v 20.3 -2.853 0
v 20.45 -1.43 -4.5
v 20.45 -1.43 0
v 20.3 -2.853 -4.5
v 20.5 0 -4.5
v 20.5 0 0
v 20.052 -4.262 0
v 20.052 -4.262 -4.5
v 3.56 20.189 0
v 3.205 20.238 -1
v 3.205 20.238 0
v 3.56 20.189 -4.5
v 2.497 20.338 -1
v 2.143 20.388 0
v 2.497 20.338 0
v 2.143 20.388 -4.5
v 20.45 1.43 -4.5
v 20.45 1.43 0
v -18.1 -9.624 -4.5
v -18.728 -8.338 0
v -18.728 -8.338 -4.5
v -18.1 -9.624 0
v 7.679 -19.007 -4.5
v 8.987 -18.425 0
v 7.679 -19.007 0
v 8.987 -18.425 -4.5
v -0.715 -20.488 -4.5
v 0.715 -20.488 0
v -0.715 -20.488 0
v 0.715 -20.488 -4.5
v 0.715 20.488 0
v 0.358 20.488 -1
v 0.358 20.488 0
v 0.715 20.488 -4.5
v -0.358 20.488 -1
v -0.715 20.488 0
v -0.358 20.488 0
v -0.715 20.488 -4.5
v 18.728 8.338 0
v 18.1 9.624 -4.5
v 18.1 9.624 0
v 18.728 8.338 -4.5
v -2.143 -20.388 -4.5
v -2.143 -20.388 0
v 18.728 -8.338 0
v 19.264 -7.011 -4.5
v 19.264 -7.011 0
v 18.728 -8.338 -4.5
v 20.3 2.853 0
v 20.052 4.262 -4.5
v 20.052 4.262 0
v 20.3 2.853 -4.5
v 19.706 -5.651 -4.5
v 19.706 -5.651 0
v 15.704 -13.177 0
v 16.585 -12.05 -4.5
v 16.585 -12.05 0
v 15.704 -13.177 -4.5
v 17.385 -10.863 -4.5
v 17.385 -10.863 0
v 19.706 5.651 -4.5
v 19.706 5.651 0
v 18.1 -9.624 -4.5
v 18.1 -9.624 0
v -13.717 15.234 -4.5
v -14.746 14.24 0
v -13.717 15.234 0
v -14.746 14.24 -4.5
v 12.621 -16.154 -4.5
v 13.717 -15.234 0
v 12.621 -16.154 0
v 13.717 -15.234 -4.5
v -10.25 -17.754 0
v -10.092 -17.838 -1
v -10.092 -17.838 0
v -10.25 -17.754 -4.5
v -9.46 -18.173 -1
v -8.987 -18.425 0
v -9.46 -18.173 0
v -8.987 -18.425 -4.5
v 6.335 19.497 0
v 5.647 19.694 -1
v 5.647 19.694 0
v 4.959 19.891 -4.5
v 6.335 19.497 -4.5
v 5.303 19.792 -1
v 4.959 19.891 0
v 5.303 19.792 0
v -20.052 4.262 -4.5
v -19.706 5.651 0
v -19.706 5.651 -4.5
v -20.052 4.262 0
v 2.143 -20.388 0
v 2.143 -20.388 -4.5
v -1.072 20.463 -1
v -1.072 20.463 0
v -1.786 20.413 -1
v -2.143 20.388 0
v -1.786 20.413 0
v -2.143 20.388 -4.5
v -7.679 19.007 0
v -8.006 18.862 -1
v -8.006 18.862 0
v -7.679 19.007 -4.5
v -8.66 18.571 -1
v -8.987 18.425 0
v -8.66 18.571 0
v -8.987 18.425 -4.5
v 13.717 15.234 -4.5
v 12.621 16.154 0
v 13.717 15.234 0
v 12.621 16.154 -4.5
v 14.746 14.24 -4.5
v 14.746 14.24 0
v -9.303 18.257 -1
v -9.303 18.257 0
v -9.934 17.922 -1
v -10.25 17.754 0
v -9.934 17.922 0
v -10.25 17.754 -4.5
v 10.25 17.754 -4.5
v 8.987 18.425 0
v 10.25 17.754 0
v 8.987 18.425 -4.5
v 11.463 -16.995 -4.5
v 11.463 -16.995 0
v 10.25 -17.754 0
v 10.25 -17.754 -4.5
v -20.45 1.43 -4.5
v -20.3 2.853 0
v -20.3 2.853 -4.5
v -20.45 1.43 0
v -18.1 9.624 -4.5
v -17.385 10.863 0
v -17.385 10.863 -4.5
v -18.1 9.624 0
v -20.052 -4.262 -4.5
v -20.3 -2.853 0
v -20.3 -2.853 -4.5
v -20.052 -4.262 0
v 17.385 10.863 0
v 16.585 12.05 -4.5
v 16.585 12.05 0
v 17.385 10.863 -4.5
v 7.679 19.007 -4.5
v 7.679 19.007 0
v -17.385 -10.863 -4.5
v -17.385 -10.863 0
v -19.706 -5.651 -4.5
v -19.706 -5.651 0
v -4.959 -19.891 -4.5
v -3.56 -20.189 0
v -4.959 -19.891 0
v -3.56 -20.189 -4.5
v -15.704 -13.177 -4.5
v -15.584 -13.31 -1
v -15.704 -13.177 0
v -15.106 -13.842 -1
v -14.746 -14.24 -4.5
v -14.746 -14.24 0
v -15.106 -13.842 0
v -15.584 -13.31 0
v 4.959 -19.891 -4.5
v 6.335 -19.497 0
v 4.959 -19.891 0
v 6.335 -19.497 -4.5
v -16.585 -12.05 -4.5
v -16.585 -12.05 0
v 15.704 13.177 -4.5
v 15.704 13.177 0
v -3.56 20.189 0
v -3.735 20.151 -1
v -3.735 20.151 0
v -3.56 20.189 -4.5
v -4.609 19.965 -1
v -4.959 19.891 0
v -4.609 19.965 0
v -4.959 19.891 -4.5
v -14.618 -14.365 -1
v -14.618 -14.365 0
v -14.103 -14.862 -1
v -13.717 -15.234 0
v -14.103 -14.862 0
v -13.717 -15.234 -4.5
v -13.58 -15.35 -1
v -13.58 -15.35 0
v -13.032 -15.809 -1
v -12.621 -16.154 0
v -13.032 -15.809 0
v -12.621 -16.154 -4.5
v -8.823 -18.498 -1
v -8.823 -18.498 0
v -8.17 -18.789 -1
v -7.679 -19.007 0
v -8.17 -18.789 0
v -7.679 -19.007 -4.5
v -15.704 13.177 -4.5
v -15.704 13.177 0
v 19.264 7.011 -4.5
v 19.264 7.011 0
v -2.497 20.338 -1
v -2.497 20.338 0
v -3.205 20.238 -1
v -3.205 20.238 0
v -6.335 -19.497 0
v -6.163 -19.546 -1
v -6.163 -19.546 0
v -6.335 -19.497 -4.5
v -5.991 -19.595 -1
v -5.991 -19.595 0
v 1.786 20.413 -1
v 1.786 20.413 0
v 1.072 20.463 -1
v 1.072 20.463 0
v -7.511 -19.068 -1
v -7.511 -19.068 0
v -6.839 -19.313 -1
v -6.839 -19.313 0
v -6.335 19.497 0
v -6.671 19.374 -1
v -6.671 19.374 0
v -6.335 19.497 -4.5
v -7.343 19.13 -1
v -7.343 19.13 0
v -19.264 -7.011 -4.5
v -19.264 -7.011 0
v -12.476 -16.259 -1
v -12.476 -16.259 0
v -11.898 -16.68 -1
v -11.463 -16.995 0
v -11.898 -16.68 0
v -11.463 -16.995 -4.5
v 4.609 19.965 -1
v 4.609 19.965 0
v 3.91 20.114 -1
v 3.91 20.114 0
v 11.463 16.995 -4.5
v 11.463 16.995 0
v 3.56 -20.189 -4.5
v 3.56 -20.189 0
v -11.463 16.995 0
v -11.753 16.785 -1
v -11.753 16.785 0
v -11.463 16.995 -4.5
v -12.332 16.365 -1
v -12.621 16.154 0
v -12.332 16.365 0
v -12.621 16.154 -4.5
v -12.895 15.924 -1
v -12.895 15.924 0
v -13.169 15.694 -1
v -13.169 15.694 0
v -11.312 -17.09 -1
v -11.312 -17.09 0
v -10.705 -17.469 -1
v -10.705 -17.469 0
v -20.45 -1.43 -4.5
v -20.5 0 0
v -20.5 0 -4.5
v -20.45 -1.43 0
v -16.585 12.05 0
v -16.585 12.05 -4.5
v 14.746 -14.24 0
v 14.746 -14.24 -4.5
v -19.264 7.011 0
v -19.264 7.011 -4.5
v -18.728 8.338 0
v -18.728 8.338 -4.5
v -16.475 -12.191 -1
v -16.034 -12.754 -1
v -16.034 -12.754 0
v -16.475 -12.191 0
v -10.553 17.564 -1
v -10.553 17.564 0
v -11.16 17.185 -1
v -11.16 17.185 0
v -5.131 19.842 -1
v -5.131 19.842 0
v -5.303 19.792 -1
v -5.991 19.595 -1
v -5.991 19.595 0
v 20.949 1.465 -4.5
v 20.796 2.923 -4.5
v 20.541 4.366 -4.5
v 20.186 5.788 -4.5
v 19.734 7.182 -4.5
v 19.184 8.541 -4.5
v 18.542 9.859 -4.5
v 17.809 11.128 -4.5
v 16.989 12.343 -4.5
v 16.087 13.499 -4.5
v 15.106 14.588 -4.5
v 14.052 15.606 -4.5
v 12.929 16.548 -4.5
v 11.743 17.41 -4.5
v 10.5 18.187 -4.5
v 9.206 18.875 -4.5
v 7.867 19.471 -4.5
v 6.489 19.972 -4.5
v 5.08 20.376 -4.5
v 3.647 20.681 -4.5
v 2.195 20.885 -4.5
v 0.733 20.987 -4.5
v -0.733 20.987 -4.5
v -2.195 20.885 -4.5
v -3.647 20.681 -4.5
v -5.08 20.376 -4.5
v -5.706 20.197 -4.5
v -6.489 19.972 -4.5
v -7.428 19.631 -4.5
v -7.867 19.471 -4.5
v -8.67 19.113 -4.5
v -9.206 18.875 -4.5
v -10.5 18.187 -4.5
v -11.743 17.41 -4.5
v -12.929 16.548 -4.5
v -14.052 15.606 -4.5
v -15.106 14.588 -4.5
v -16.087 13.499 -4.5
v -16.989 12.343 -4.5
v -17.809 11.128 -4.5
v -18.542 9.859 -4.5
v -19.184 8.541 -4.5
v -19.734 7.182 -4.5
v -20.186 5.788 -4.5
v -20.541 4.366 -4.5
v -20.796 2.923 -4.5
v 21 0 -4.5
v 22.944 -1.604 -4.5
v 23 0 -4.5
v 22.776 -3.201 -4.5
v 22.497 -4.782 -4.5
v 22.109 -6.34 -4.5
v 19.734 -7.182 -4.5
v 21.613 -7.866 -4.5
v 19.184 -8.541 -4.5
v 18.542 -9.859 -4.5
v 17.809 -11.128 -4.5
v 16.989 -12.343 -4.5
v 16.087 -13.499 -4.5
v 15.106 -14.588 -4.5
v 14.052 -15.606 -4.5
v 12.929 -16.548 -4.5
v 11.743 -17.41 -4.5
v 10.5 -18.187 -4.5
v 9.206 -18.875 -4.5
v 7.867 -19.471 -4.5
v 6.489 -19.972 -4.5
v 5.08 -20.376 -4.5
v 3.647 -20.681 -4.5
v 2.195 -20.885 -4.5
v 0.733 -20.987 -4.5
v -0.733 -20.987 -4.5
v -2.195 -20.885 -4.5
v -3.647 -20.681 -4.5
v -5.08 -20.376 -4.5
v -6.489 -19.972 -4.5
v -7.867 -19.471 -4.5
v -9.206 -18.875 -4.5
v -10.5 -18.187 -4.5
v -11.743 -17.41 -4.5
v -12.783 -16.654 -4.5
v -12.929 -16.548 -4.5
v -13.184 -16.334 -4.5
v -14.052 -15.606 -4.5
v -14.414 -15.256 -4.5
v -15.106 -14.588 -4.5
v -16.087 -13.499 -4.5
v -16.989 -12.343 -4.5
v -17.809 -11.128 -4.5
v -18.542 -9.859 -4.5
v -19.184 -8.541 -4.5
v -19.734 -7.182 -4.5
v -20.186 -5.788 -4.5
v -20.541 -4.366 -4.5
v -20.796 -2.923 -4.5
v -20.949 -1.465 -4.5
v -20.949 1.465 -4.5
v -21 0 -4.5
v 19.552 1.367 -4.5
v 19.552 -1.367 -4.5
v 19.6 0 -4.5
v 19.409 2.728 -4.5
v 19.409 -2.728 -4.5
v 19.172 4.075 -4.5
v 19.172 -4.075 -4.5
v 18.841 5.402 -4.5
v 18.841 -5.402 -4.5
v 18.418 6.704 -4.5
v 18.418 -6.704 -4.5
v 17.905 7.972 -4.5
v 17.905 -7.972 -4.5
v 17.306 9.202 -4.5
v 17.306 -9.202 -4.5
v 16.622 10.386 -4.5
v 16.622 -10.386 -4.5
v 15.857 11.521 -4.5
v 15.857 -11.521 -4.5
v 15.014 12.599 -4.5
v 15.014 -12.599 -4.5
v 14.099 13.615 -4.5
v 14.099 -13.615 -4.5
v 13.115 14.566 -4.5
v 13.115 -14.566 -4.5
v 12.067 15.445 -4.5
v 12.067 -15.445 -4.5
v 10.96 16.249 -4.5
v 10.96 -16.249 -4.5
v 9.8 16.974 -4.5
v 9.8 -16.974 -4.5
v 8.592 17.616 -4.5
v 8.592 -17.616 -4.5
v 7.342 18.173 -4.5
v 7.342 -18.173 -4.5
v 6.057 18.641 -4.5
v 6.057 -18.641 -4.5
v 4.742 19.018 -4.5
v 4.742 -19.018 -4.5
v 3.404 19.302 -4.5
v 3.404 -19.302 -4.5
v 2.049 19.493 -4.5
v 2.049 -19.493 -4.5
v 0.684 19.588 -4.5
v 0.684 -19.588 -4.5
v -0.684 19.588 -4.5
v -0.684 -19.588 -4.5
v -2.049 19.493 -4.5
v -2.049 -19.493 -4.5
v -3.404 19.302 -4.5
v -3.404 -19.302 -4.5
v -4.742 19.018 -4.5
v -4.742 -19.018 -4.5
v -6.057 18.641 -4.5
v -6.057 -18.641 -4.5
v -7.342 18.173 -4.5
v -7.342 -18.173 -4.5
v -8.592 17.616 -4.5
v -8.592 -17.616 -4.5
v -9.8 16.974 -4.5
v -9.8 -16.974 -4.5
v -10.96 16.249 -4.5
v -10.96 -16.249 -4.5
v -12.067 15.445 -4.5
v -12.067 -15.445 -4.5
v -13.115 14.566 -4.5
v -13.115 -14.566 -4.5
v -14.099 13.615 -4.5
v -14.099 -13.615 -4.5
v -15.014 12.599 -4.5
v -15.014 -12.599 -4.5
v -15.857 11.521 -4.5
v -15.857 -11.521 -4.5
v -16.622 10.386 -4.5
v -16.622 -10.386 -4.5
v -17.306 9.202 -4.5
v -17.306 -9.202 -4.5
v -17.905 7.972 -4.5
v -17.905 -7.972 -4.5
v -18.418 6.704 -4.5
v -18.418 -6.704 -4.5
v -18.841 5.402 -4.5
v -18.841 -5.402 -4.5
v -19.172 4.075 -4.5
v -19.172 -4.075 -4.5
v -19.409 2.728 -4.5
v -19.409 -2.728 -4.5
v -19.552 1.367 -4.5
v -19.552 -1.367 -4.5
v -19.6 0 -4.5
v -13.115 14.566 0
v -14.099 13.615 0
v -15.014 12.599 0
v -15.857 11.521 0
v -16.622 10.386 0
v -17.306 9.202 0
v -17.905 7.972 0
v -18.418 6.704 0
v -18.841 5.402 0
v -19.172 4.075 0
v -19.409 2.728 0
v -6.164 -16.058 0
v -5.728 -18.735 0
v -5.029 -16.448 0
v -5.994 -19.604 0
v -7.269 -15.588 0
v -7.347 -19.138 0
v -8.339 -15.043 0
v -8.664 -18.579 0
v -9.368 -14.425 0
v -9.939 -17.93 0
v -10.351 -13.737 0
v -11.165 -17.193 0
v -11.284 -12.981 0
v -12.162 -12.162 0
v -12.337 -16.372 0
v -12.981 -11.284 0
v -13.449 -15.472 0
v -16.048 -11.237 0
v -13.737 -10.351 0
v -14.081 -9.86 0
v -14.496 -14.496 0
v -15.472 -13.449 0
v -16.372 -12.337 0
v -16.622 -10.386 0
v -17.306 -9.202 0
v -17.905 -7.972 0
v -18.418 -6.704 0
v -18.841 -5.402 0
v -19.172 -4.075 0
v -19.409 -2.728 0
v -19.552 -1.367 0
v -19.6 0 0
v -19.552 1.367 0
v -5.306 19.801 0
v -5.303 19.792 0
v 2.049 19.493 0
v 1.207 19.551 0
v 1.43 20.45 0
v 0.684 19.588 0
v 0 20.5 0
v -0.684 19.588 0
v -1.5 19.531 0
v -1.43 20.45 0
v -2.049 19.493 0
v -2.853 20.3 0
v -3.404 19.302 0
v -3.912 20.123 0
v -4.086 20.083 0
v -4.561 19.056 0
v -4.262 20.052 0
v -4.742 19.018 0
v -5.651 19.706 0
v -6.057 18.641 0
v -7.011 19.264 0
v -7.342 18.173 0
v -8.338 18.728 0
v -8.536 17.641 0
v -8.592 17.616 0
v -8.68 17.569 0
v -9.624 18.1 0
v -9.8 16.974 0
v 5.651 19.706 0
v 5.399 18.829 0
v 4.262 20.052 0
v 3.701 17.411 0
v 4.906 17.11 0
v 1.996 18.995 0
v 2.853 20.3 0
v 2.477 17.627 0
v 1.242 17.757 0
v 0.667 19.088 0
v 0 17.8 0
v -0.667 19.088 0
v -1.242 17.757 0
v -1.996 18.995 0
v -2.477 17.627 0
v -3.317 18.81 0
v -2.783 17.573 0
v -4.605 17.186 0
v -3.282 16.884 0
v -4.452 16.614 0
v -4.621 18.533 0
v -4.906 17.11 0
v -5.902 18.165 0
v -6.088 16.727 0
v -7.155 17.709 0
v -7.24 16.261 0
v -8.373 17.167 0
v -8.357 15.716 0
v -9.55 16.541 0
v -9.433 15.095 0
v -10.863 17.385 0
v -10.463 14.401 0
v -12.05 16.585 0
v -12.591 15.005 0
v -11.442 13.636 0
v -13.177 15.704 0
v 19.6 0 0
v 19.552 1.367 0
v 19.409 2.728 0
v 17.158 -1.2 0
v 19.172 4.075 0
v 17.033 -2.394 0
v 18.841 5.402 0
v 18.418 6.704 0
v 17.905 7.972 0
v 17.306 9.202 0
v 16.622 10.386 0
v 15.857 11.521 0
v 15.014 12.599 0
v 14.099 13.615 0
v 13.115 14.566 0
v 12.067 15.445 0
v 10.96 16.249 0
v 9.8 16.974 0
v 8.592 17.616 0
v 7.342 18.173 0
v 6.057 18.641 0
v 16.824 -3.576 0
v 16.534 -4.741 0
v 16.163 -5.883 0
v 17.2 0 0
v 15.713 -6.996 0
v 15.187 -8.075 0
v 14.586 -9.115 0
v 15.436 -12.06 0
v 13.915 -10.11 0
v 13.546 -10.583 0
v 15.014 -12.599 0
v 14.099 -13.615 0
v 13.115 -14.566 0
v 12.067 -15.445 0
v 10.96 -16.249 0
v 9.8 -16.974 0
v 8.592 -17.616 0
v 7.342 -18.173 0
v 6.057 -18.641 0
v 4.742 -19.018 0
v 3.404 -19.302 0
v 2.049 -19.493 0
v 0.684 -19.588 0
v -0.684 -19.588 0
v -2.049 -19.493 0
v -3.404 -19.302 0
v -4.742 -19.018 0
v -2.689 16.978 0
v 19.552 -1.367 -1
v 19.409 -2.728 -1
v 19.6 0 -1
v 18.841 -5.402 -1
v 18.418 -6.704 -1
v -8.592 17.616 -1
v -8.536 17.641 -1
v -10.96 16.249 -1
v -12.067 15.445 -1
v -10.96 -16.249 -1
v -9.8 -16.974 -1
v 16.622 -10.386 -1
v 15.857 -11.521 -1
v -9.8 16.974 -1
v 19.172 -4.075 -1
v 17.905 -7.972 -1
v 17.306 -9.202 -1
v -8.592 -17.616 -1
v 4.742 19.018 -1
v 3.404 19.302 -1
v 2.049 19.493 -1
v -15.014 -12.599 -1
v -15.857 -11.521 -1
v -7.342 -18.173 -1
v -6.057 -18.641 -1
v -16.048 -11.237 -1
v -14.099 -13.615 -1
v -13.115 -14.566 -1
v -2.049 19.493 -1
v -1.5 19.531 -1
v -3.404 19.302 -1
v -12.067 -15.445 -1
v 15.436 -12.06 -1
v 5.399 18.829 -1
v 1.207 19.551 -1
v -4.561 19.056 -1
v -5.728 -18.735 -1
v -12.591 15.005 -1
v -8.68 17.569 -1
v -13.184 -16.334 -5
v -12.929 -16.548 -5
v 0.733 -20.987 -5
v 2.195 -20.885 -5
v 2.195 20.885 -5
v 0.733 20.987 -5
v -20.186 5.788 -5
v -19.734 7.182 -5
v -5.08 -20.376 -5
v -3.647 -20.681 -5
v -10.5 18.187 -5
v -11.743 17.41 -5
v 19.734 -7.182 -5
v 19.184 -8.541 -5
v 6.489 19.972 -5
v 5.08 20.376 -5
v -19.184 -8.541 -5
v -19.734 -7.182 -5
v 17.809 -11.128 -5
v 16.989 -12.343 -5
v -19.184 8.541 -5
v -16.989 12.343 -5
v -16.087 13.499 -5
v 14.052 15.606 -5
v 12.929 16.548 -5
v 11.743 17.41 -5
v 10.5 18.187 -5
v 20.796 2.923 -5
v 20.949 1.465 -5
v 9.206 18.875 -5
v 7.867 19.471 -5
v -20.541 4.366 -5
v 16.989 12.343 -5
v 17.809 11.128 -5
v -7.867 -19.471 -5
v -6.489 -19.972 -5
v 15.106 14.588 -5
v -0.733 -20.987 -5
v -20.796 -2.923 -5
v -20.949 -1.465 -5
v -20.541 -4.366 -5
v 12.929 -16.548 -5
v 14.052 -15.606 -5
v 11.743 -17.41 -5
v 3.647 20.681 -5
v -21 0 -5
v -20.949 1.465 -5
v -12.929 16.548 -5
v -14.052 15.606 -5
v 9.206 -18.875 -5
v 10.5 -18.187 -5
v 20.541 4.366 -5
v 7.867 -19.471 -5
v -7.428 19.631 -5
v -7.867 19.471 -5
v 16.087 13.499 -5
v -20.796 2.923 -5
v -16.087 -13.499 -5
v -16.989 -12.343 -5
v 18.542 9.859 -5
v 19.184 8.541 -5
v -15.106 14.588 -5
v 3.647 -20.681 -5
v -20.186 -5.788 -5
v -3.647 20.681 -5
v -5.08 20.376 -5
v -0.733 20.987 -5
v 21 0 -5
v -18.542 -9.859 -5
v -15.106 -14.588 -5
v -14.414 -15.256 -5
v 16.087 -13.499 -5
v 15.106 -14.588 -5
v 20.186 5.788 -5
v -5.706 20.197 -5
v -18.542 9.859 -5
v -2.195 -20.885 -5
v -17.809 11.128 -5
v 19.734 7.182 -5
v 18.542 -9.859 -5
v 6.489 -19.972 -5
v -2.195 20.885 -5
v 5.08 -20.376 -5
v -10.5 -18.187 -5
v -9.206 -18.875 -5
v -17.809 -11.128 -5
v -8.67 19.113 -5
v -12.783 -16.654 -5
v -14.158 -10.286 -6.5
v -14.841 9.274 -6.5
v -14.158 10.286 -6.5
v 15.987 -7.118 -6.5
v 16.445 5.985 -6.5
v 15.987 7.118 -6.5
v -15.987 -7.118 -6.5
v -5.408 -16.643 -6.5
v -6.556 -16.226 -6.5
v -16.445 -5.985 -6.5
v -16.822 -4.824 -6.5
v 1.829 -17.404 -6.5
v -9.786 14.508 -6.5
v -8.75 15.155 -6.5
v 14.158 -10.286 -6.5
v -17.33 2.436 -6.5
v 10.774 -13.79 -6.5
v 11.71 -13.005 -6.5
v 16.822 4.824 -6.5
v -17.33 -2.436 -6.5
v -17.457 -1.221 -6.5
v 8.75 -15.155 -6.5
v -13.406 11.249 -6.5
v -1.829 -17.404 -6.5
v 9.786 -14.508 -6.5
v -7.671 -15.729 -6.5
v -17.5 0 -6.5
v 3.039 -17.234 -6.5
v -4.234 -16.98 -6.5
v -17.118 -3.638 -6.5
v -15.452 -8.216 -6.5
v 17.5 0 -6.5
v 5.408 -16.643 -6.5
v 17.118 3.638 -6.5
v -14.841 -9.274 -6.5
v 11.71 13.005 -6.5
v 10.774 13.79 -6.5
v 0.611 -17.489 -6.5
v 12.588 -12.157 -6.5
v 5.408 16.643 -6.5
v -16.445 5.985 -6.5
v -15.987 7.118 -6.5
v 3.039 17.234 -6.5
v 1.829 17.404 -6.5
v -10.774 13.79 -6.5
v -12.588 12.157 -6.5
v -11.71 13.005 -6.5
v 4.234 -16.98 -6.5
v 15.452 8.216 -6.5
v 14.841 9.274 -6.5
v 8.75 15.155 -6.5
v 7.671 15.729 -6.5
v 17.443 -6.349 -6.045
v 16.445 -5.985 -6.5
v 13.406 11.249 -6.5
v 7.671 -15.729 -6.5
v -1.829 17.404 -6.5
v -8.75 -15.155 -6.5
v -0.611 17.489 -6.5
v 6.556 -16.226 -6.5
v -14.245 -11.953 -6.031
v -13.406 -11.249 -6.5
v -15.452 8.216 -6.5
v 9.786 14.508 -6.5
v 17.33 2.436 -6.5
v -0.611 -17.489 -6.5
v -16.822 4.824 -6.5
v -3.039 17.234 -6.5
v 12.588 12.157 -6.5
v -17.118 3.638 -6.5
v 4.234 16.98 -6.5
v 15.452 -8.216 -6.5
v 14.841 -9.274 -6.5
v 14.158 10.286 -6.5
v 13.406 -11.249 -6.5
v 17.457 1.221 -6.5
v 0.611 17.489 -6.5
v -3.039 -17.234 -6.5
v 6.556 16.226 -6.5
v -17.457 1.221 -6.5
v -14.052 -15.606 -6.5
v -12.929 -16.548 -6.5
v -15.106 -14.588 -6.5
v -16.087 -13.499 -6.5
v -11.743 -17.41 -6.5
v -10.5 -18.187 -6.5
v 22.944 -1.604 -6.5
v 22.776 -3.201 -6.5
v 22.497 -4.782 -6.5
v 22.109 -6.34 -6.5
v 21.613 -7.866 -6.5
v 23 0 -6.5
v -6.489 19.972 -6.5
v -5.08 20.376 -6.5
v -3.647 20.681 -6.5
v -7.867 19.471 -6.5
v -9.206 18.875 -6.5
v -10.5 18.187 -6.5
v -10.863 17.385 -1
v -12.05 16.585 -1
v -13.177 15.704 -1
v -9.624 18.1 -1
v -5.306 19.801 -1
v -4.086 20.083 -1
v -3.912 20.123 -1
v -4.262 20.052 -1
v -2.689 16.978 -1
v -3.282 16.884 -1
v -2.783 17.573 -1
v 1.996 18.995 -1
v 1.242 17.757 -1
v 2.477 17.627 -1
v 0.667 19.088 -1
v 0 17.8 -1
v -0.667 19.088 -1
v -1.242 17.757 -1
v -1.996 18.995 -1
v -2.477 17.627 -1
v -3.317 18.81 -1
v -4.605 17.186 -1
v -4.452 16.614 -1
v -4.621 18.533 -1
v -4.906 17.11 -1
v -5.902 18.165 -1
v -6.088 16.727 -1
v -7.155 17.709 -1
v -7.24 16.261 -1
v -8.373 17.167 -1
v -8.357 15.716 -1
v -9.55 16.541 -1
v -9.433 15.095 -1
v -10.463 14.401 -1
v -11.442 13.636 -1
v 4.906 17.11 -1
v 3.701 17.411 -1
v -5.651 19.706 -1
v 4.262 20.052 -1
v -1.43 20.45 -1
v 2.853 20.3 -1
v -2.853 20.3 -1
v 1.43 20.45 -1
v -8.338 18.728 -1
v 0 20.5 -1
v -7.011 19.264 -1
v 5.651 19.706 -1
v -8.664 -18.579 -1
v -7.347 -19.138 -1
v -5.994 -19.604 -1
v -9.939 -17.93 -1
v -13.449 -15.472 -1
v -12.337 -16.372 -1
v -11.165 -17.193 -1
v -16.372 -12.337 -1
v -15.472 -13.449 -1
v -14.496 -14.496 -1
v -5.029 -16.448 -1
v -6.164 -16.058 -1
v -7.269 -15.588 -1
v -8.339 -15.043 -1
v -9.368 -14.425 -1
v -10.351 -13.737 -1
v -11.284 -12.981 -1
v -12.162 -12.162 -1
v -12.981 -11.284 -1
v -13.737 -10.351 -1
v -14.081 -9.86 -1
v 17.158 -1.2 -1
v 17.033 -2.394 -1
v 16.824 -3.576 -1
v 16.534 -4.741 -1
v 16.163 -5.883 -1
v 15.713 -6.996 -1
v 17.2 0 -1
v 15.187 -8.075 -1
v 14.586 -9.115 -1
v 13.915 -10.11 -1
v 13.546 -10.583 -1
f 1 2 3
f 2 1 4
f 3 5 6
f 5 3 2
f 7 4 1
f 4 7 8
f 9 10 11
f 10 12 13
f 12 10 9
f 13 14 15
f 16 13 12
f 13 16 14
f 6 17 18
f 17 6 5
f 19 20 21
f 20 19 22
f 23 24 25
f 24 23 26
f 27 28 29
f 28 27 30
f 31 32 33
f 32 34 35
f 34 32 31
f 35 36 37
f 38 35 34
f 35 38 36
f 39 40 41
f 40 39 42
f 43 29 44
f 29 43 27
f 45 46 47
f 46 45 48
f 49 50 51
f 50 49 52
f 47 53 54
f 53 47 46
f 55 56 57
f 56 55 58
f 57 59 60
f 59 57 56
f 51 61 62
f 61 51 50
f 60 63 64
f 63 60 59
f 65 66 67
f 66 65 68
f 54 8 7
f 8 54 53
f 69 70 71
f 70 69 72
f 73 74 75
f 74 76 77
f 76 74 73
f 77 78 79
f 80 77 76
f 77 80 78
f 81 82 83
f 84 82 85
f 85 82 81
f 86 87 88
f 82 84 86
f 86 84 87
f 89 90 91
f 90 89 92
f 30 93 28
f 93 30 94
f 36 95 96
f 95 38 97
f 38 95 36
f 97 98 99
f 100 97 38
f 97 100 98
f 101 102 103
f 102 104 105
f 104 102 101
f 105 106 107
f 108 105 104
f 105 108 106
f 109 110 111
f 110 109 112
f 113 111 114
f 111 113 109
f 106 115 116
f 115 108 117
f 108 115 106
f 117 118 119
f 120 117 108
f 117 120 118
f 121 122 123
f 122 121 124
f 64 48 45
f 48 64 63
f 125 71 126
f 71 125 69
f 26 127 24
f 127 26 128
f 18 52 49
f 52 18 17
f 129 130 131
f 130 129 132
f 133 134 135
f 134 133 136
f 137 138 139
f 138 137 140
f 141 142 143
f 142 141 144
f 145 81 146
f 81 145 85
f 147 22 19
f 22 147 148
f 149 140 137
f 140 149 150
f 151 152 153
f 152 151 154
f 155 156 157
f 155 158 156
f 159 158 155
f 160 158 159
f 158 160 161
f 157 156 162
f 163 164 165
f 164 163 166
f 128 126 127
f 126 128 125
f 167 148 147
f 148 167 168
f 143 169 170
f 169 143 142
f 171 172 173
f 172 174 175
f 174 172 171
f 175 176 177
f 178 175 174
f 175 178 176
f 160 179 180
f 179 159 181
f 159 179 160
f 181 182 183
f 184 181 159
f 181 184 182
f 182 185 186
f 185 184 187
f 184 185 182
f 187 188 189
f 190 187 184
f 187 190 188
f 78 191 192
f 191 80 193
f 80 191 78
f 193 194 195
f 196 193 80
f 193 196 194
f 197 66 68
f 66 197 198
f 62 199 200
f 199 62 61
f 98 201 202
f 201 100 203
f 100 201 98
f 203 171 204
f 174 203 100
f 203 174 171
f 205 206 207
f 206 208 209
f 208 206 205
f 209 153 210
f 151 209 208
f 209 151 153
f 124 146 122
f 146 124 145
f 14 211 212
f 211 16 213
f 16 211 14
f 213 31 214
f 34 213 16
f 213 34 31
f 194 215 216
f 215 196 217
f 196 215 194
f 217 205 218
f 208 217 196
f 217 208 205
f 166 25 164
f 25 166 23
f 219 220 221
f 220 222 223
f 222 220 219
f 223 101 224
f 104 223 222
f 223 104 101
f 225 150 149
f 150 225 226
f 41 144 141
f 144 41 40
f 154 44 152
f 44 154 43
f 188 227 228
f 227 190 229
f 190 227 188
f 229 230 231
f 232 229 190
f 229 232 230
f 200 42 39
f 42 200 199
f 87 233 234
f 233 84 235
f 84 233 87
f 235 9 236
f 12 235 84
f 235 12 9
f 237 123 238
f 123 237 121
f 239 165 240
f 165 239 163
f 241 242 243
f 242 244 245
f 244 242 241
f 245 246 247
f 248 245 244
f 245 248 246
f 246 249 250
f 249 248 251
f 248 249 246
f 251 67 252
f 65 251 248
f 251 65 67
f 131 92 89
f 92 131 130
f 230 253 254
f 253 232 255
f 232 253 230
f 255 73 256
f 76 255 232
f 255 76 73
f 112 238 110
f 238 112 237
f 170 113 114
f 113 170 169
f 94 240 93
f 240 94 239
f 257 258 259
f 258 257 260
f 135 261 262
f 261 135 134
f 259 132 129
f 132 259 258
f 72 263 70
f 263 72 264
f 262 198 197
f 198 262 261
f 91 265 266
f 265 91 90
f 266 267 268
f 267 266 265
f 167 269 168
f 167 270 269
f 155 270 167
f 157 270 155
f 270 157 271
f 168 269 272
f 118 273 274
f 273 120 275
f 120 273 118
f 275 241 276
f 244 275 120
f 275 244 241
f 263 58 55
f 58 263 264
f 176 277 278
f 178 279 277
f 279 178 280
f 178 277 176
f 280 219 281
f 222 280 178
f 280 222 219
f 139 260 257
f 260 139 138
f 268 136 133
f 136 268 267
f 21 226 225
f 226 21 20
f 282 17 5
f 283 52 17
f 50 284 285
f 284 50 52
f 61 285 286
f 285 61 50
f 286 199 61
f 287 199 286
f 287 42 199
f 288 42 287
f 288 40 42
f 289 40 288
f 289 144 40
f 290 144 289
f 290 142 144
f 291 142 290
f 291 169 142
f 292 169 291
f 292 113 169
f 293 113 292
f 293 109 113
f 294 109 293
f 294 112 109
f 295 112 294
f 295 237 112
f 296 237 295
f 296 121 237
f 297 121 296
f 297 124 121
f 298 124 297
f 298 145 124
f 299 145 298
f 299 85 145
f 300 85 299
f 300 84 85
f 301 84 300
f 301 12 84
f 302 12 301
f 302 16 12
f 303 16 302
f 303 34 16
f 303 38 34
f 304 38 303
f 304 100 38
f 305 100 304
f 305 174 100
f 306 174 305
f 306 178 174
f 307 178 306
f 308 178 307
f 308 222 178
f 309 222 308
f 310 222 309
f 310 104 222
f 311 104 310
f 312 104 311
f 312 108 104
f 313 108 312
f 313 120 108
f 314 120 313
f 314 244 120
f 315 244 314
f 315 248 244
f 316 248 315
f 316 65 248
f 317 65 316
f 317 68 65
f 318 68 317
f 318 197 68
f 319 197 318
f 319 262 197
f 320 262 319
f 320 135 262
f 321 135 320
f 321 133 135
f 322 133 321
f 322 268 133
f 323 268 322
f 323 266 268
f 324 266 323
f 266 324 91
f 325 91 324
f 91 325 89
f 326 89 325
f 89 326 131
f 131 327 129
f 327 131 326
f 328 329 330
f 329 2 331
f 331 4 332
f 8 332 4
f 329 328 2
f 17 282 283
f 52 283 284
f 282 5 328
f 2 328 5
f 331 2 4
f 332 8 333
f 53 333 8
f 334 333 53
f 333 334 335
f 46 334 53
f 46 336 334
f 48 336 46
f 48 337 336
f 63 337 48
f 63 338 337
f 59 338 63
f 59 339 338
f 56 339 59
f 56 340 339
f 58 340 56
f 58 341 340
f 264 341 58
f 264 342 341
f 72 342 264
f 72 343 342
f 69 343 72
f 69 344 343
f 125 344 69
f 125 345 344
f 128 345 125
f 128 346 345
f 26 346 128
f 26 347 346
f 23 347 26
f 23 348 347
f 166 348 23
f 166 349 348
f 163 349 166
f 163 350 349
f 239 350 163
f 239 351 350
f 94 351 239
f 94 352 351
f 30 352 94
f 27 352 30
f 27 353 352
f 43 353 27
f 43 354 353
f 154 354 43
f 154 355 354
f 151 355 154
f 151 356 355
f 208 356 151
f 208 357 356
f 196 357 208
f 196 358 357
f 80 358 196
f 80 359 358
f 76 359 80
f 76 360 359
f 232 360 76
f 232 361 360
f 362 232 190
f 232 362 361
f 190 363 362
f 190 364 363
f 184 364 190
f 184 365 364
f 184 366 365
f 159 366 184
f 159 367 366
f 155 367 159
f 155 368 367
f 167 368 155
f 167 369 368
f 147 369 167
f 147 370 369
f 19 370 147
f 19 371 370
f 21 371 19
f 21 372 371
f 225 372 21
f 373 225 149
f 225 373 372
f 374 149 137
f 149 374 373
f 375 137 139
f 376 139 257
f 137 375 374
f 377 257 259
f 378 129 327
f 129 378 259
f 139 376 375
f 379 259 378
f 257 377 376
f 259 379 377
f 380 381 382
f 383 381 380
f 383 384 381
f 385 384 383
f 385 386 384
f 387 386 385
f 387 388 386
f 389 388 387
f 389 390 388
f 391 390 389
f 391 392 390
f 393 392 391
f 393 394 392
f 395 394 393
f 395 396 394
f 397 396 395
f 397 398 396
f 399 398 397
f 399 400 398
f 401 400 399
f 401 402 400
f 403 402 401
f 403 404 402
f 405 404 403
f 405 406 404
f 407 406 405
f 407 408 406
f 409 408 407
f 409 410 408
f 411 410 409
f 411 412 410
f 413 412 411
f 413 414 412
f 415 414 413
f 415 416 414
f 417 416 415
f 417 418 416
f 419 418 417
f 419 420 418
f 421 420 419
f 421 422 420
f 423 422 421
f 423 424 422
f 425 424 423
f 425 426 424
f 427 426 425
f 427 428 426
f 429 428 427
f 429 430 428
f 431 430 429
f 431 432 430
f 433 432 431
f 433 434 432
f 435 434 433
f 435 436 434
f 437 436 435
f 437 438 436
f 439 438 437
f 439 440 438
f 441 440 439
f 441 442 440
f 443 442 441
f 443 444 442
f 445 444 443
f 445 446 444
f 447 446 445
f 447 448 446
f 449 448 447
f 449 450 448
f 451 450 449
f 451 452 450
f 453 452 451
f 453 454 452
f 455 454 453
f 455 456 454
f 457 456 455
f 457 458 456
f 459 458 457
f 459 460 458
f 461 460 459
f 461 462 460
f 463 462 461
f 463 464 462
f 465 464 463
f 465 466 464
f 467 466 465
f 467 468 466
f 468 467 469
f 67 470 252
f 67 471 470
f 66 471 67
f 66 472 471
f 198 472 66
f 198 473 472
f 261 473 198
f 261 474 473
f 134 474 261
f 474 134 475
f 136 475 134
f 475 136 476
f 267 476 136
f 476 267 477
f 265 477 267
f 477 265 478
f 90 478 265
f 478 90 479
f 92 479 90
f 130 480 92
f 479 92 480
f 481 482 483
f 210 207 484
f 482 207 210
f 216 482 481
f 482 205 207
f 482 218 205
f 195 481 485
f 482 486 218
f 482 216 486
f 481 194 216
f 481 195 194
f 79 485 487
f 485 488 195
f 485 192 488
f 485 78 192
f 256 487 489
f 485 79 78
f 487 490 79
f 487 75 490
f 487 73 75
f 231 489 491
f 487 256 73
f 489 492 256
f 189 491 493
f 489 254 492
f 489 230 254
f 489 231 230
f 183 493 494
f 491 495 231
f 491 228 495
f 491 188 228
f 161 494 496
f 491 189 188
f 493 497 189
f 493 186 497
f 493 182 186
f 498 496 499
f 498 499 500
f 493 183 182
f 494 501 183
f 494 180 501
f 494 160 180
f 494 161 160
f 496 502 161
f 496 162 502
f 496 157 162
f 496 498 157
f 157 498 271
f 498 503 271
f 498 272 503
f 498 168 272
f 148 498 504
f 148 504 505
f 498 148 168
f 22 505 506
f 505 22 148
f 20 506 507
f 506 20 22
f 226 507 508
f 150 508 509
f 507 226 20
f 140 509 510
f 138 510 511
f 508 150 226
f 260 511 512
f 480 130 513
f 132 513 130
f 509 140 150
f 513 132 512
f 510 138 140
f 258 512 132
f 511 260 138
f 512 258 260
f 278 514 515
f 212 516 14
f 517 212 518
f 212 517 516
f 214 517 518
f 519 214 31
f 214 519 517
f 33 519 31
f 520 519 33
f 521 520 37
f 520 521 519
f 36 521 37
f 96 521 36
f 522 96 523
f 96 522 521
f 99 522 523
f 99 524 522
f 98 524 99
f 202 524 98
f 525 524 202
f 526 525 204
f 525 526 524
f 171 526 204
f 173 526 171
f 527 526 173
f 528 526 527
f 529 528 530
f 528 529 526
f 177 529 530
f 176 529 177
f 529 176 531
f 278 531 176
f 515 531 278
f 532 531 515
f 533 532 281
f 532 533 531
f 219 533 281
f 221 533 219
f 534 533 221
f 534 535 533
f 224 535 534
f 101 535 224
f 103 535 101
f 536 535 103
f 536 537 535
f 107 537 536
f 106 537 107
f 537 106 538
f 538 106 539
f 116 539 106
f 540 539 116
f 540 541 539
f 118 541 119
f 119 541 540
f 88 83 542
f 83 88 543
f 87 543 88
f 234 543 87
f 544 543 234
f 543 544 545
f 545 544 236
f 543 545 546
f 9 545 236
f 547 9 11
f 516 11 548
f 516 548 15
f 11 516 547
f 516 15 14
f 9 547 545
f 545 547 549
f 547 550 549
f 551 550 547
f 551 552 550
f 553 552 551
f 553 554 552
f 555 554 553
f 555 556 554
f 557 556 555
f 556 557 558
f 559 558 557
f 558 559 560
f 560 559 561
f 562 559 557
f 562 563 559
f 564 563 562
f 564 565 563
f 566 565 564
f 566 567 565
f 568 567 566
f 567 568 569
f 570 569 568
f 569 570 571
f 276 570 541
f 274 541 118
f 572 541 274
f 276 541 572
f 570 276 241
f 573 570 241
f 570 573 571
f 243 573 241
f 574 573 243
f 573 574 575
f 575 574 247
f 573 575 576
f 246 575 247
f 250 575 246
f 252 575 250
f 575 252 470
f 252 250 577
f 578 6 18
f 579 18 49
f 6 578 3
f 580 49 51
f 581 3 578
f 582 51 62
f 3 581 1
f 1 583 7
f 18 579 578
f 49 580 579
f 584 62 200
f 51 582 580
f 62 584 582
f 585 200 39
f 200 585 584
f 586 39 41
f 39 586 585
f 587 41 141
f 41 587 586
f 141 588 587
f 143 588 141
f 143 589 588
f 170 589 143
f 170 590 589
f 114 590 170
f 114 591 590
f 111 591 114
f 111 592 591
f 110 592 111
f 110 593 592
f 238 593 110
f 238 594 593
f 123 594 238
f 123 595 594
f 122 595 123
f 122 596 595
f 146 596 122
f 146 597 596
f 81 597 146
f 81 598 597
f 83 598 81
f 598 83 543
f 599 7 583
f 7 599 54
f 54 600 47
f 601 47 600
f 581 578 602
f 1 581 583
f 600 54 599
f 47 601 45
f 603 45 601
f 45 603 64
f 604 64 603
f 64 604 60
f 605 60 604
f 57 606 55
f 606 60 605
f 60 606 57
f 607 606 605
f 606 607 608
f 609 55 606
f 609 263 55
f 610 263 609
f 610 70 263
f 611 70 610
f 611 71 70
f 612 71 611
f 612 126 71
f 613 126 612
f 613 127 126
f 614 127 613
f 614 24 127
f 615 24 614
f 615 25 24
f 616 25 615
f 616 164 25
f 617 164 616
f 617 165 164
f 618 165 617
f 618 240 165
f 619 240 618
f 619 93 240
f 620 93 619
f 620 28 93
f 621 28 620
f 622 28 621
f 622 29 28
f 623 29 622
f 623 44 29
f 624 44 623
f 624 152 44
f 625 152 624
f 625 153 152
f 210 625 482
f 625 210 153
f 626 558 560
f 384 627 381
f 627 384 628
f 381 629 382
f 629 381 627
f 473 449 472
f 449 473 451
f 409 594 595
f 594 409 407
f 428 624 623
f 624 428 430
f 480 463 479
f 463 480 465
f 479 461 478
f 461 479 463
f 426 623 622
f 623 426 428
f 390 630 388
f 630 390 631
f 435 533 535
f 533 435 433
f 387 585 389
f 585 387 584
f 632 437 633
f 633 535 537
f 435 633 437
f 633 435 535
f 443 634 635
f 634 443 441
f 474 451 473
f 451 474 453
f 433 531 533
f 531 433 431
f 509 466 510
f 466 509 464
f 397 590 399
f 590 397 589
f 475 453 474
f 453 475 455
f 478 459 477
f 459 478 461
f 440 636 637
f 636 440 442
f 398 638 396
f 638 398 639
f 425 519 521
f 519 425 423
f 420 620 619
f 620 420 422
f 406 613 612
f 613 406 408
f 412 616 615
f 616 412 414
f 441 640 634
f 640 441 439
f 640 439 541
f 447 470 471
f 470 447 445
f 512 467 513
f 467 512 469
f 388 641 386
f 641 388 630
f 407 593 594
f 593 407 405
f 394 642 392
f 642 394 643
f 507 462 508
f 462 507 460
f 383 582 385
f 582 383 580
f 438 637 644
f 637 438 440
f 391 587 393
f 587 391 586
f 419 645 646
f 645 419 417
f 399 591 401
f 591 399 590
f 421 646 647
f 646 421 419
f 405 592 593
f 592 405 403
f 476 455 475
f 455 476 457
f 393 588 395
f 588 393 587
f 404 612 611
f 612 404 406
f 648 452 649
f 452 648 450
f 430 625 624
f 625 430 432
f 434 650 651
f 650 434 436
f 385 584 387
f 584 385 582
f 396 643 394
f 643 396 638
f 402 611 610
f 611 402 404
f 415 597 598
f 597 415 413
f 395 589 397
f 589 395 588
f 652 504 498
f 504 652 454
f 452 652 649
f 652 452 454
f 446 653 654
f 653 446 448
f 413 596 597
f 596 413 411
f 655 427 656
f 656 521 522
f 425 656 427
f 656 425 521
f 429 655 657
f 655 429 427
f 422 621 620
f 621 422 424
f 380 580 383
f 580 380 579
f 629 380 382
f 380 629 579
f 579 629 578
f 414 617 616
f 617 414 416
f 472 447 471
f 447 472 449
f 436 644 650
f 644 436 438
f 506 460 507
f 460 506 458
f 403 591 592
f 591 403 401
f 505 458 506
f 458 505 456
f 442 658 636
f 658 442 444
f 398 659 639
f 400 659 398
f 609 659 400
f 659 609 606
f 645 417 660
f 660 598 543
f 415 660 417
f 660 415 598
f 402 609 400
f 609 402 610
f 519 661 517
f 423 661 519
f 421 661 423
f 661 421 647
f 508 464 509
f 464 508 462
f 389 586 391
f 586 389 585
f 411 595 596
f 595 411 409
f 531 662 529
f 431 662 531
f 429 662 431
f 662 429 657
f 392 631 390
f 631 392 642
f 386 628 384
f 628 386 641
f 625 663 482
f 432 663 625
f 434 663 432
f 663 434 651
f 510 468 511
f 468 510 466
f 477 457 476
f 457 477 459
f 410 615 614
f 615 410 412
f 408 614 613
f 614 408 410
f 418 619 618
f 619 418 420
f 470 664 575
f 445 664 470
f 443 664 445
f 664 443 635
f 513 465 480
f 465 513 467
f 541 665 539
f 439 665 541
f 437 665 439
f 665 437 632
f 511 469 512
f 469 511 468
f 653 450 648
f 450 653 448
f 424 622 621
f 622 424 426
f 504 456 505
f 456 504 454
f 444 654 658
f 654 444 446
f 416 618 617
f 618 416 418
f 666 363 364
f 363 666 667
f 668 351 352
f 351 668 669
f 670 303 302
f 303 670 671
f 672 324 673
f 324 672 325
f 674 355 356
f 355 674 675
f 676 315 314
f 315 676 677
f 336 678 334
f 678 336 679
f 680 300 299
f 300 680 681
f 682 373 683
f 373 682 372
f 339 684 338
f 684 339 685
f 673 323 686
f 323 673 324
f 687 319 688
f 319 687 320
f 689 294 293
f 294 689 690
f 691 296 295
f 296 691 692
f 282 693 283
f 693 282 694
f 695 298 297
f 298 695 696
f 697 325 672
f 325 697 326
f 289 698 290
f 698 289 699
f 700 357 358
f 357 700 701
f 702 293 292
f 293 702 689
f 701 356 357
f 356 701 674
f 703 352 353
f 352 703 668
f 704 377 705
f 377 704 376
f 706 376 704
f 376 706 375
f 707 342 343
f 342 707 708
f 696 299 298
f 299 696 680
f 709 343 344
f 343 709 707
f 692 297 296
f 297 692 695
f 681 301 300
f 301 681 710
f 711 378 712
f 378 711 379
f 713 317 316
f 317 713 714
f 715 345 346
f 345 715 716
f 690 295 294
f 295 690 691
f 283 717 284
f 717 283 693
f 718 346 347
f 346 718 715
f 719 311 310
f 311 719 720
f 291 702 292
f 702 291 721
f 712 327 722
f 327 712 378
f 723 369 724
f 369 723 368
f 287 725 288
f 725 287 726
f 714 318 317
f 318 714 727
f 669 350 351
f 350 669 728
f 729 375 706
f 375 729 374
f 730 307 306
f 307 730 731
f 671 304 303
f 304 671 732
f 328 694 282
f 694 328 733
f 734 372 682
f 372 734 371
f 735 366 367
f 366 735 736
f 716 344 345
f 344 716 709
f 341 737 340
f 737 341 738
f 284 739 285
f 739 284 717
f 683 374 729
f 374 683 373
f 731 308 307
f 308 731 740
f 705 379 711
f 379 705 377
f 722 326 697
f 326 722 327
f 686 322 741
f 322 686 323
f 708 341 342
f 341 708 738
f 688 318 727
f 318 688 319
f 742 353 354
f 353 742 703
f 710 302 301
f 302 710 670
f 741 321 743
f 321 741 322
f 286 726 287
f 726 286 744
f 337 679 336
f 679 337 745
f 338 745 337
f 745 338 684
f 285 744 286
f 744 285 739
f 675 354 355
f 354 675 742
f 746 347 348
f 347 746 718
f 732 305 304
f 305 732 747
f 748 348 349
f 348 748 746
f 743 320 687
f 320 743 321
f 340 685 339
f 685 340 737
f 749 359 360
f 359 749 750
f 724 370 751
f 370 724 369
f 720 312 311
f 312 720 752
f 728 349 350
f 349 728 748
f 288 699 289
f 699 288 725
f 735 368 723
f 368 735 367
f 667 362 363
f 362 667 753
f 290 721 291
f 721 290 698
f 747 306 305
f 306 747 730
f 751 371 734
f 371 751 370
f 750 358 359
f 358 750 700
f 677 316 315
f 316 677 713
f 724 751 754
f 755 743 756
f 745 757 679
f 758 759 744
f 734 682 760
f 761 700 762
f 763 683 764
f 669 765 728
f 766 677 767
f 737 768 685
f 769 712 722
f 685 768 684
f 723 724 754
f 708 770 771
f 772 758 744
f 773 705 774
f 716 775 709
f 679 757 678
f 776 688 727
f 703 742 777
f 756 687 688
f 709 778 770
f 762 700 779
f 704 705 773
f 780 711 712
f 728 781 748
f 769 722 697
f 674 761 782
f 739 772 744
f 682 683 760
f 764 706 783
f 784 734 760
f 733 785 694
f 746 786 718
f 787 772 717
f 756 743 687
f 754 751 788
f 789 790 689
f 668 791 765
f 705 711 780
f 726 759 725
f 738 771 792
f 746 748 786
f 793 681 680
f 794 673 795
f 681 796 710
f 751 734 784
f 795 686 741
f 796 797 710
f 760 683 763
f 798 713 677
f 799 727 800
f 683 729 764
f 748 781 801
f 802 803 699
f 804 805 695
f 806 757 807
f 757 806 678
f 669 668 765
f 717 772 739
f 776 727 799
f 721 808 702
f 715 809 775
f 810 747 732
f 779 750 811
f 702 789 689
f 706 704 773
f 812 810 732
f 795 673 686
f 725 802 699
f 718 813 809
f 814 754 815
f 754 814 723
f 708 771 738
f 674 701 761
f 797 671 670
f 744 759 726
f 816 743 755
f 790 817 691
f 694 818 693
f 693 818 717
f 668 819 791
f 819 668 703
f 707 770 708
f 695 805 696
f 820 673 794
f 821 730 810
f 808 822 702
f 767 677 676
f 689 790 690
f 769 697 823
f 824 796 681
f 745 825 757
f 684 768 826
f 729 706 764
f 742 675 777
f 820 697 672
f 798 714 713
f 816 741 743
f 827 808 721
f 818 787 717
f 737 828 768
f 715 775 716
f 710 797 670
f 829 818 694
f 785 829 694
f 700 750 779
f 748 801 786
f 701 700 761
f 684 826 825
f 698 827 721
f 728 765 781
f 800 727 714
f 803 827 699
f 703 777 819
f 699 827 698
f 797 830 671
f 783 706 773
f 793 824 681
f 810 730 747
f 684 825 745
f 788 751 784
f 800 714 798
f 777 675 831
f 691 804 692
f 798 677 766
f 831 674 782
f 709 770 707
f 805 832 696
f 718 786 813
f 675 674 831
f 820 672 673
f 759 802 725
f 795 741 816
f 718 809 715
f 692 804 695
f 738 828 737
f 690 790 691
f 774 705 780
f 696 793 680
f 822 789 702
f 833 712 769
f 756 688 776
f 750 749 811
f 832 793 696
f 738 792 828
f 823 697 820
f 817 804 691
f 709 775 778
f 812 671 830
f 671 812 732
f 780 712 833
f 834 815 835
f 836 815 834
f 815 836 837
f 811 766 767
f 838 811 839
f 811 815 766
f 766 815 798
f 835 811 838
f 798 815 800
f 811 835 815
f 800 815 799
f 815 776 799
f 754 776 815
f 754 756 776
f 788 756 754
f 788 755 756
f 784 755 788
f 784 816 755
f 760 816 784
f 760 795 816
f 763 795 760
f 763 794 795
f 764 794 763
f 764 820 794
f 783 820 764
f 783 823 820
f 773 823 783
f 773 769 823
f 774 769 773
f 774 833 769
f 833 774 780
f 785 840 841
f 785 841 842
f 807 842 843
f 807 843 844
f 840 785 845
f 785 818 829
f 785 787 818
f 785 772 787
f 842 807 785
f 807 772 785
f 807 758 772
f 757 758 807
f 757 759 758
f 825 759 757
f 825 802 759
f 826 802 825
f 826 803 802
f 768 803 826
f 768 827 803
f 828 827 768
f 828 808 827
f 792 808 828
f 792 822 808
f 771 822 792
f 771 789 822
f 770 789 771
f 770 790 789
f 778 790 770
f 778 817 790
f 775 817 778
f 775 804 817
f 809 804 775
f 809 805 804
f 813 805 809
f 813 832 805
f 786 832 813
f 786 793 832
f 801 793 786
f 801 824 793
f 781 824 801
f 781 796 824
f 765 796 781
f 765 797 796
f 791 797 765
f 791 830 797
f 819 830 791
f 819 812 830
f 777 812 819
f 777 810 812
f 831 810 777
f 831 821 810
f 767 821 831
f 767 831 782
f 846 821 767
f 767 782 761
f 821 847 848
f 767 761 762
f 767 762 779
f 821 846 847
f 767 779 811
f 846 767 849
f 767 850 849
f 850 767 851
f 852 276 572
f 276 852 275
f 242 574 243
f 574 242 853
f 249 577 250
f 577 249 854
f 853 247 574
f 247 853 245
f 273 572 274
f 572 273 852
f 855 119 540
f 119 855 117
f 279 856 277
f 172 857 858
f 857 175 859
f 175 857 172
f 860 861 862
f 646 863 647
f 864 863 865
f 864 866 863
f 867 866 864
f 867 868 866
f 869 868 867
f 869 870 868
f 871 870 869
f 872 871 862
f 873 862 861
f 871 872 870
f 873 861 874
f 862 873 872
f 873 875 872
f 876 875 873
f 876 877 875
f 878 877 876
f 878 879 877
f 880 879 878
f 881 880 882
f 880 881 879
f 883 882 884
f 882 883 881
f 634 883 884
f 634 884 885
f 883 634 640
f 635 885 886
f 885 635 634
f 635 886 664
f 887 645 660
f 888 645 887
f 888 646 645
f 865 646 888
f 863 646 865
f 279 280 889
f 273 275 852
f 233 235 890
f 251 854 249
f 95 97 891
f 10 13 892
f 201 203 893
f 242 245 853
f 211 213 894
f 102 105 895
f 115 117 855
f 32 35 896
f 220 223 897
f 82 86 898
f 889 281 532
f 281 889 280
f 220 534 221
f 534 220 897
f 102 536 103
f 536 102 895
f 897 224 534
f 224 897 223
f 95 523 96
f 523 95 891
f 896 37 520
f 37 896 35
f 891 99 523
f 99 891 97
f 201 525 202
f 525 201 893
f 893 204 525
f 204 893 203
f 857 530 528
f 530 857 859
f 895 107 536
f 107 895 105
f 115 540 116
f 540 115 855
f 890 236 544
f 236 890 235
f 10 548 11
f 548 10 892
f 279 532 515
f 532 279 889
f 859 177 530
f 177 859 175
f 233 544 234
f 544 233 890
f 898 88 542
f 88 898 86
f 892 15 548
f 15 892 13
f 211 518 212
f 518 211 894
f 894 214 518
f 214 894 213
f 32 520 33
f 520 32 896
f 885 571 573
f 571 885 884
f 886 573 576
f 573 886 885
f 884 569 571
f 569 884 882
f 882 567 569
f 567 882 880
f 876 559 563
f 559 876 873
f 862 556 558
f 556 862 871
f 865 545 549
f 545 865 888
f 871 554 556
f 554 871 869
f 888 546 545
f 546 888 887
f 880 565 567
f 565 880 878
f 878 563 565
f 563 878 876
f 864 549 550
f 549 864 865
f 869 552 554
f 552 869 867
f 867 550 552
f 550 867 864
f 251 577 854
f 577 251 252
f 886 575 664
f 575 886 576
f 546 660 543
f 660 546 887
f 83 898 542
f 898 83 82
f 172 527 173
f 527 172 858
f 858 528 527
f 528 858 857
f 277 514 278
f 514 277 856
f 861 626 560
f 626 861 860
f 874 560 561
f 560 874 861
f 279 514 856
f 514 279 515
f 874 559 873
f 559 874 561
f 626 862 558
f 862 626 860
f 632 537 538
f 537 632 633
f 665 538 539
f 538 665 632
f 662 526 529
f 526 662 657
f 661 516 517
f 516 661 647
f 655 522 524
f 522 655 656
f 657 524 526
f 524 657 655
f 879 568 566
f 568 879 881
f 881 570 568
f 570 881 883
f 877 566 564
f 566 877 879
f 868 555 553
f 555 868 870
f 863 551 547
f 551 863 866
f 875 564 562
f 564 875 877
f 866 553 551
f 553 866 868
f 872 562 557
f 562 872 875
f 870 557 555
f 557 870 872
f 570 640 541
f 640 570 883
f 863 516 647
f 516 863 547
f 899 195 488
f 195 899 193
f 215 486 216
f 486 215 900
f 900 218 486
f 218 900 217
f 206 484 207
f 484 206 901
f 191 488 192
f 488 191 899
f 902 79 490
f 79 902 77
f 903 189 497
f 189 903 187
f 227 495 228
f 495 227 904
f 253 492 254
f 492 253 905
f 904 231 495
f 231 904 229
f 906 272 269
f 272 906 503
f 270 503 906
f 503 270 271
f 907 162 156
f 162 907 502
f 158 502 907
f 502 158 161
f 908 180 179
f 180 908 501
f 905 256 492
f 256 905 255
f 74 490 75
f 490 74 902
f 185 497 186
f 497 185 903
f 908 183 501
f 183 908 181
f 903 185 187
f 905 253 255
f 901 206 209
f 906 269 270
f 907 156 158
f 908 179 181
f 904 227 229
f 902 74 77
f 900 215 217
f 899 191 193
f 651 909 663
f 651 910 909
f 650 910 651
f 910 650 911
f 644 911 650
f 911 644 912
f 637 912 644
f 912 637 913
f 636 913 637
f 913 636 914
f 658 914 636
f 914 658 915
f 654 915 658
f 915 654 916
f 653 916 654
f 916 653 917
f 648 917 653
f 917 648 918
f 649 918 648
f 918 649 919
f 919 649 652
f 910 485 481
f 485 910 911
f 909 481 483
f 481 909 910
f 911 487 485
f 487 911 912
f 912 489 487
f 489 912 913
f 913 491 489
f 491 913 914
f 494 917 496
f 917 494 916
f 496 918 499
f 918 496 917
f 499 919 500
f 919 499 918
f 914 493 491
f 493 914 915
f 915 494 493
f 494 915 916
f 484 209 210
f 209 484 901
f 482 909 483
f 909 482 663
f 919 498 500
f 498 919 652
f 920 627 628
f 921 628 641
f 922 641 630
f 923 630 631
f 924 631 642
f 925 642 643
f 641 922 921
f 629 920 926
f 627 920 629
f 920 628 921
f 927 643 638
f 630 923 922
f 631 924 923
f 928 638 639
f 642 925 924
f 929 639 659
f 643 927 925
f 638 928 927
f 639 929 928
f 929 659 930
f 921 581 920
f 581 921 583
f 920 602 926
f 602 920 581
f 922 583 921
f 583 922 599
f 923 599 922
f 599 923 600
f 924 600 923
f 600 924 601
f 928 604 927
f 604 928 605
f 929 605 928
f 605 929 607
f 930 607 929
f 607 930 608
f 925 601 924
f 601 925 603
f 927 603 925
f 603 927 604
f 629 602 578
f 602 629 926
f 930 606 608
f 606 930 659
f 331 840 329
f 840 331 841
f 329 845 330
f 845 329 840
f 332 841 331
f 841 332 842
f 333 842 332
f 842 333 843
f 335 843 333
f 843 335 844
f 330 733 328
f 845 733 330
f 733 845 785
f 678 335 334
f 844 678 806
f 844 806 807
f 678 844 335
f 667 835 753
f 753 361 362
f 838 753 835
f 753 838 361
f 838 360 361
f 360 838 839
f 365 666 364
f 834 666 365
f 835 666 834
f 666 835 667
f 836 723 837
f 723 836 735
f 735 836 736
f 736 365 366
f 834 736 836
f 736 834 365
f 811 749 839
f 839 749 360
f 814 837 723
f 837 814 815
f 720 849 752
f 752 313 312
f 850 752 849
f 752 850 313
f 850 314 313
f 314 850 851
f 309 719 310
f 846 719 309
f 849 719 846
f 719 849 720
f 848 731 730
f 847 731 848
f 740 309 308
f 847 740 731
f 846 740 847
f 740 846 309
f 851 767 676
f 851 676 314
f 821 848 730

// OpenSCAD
// file: my_lib.scad
tolerance = 0.15; 

module bigger(t = tolerance) {
    if (t > 0) {
        minkowski() {
            child(0);
            cube(t, true);
        }
    } else {
        child(0);
    }
}

rounding = 1;
module round(r = rounding) {
	minkowski() {
		child(0);
		sphere(r);
	}
}

module tube(outer_radius, inner_radius, height) {
    difference() {
        cylinder(h = height, r = outer_radius);
        translate([ 0, 0, -1]) cylinder(h = height + 2, r = inner_radius);
    }
}

module pie_slice(outer_radius, inner_radius, angle, height) {
    o1 = outer_radius + 1;
    blocking_half = [2* o1, o1, height + 1];
	blocking_quarter = [o1, o1, height + 1];
	if (angle <= 0) {
		//nothing
	} else if (angle <= 90) {
		difference() {
			tube(outer_radius, inner_radius, height);
			translate([-o1, -o1, -0.5]) cube(blocking_half);
			translate([-o1, -0.5, -0.5]) cube(blocking_quarter);
			rotate([0,0,angle]) translate([0, 0, -0.5]) cube(blocking_quarter);
		}
	} else if (angle <= 180) {
		difference() {
			tube(outer_radius, inner_radius, height);
			translate([-o1, -o1, -0.5]) cube(blocking_half);
			rotate([0,0,angle]) translate([0, 0, -0.5]) cube(blocking_quarter);
		}
	} else if (angle <= 270) {
		difference() {
			tube(outer_radius, inner_radius, height);
			translate([0, -o1, -0.5]) cube(blocking_quarter);
			rotate([0,0,angle]) translate([0, 0, -0.5]) cube(blocking_quarter);
		}
	} else if (angle <= 360) {
		difference() {
			tube(outer_radius, inner_radius, height);
			intersection() {
				translate([0, -o1, -0.5]) cube(blocking_quarter);
				rotate([0,0,angle]) translate([0, 0, -0.5]) cube(blocking_quarter);
			}
		}
	} else {
		tube(outer_radius, inner_radius, height);
	}
}

module torus (r1 = 2, r2 = 1, a = 360) {
	intersection() {
		rotate_extrude(convexity = 10, $fn = 50)
			translate([r1, 0, 0])
				circle(r = r2, $fn = 20);
		translate([0, 0, -r2 -0.5])
			pie_slice(r1 + r2 + 1, r1 - r2 - 1, a, 2*r2 + 1);
	}
}

module trapeze(h, w, r1, r2, center = false) {
    rotate([-90,0,0]) linear_extrude(height = w) projection(false) rotate([90,0,0]) cylinder(h, r1/2, r2/2, center);
}
// main file
$fa=4;
$fs=0.5;

include <my_lib.scad>

//ring
r_out = 41/2;
r_thick = 0.9;
r_in = r_out - r_thick;
r_height = 4.5;

//cover
c_out = r_out + 0.5;
c_in = r_out - 3;
c_h1 = 0.5;
c_h2 = 1.5;

//
goes_back = 3.3;

//shapes

rotate([180,0,0]) cap();

module cap() {
	union() {
		tube(r_out, r_in, r_height);
		translate([0,0,r_height]) {
			cylinder(r1 = c_out, r2 = c_out, h = c_h1);
			translate([0,0,c_h1])
				cylinder(r1 = c_out, r2 = c_in, h = c_h2);
		}
		rotate([0,0,230])
			difference () {
				union() {
					pie_slice(r_out, r_out - 2.7, 56, 1);
					rotate([0,0,25]) pie_slice(r_out,r_out - goes_back,6,1);
				}
				translate([0,0,-0.5]) rotate([0,0,10]) pie_slice(r_in, r_in - 0.5, 36, 2);
			}
		rotate([0,0,107]) pie_slice(r_out, r_out - goes_back, 38, 1);
		rotate([0,0,0]) pie_slice(r_out, r_out - goes_back, 38, 1);
		rotate([0,0,0]) translate([0, 0, r_height]) pie_slice(c_out+2, 0, 20, c_h1+c_h2);
		rotate([0,0,120]) translate([0, 0, r_height]) pie_slice(c_out, 0, 20, c_h1+c_h2);
		rotate([0,0,240]) translate([0, 0, r_height]) pie_slice(c_out, 0, 20, c_h1+c_h2);
	}
}
